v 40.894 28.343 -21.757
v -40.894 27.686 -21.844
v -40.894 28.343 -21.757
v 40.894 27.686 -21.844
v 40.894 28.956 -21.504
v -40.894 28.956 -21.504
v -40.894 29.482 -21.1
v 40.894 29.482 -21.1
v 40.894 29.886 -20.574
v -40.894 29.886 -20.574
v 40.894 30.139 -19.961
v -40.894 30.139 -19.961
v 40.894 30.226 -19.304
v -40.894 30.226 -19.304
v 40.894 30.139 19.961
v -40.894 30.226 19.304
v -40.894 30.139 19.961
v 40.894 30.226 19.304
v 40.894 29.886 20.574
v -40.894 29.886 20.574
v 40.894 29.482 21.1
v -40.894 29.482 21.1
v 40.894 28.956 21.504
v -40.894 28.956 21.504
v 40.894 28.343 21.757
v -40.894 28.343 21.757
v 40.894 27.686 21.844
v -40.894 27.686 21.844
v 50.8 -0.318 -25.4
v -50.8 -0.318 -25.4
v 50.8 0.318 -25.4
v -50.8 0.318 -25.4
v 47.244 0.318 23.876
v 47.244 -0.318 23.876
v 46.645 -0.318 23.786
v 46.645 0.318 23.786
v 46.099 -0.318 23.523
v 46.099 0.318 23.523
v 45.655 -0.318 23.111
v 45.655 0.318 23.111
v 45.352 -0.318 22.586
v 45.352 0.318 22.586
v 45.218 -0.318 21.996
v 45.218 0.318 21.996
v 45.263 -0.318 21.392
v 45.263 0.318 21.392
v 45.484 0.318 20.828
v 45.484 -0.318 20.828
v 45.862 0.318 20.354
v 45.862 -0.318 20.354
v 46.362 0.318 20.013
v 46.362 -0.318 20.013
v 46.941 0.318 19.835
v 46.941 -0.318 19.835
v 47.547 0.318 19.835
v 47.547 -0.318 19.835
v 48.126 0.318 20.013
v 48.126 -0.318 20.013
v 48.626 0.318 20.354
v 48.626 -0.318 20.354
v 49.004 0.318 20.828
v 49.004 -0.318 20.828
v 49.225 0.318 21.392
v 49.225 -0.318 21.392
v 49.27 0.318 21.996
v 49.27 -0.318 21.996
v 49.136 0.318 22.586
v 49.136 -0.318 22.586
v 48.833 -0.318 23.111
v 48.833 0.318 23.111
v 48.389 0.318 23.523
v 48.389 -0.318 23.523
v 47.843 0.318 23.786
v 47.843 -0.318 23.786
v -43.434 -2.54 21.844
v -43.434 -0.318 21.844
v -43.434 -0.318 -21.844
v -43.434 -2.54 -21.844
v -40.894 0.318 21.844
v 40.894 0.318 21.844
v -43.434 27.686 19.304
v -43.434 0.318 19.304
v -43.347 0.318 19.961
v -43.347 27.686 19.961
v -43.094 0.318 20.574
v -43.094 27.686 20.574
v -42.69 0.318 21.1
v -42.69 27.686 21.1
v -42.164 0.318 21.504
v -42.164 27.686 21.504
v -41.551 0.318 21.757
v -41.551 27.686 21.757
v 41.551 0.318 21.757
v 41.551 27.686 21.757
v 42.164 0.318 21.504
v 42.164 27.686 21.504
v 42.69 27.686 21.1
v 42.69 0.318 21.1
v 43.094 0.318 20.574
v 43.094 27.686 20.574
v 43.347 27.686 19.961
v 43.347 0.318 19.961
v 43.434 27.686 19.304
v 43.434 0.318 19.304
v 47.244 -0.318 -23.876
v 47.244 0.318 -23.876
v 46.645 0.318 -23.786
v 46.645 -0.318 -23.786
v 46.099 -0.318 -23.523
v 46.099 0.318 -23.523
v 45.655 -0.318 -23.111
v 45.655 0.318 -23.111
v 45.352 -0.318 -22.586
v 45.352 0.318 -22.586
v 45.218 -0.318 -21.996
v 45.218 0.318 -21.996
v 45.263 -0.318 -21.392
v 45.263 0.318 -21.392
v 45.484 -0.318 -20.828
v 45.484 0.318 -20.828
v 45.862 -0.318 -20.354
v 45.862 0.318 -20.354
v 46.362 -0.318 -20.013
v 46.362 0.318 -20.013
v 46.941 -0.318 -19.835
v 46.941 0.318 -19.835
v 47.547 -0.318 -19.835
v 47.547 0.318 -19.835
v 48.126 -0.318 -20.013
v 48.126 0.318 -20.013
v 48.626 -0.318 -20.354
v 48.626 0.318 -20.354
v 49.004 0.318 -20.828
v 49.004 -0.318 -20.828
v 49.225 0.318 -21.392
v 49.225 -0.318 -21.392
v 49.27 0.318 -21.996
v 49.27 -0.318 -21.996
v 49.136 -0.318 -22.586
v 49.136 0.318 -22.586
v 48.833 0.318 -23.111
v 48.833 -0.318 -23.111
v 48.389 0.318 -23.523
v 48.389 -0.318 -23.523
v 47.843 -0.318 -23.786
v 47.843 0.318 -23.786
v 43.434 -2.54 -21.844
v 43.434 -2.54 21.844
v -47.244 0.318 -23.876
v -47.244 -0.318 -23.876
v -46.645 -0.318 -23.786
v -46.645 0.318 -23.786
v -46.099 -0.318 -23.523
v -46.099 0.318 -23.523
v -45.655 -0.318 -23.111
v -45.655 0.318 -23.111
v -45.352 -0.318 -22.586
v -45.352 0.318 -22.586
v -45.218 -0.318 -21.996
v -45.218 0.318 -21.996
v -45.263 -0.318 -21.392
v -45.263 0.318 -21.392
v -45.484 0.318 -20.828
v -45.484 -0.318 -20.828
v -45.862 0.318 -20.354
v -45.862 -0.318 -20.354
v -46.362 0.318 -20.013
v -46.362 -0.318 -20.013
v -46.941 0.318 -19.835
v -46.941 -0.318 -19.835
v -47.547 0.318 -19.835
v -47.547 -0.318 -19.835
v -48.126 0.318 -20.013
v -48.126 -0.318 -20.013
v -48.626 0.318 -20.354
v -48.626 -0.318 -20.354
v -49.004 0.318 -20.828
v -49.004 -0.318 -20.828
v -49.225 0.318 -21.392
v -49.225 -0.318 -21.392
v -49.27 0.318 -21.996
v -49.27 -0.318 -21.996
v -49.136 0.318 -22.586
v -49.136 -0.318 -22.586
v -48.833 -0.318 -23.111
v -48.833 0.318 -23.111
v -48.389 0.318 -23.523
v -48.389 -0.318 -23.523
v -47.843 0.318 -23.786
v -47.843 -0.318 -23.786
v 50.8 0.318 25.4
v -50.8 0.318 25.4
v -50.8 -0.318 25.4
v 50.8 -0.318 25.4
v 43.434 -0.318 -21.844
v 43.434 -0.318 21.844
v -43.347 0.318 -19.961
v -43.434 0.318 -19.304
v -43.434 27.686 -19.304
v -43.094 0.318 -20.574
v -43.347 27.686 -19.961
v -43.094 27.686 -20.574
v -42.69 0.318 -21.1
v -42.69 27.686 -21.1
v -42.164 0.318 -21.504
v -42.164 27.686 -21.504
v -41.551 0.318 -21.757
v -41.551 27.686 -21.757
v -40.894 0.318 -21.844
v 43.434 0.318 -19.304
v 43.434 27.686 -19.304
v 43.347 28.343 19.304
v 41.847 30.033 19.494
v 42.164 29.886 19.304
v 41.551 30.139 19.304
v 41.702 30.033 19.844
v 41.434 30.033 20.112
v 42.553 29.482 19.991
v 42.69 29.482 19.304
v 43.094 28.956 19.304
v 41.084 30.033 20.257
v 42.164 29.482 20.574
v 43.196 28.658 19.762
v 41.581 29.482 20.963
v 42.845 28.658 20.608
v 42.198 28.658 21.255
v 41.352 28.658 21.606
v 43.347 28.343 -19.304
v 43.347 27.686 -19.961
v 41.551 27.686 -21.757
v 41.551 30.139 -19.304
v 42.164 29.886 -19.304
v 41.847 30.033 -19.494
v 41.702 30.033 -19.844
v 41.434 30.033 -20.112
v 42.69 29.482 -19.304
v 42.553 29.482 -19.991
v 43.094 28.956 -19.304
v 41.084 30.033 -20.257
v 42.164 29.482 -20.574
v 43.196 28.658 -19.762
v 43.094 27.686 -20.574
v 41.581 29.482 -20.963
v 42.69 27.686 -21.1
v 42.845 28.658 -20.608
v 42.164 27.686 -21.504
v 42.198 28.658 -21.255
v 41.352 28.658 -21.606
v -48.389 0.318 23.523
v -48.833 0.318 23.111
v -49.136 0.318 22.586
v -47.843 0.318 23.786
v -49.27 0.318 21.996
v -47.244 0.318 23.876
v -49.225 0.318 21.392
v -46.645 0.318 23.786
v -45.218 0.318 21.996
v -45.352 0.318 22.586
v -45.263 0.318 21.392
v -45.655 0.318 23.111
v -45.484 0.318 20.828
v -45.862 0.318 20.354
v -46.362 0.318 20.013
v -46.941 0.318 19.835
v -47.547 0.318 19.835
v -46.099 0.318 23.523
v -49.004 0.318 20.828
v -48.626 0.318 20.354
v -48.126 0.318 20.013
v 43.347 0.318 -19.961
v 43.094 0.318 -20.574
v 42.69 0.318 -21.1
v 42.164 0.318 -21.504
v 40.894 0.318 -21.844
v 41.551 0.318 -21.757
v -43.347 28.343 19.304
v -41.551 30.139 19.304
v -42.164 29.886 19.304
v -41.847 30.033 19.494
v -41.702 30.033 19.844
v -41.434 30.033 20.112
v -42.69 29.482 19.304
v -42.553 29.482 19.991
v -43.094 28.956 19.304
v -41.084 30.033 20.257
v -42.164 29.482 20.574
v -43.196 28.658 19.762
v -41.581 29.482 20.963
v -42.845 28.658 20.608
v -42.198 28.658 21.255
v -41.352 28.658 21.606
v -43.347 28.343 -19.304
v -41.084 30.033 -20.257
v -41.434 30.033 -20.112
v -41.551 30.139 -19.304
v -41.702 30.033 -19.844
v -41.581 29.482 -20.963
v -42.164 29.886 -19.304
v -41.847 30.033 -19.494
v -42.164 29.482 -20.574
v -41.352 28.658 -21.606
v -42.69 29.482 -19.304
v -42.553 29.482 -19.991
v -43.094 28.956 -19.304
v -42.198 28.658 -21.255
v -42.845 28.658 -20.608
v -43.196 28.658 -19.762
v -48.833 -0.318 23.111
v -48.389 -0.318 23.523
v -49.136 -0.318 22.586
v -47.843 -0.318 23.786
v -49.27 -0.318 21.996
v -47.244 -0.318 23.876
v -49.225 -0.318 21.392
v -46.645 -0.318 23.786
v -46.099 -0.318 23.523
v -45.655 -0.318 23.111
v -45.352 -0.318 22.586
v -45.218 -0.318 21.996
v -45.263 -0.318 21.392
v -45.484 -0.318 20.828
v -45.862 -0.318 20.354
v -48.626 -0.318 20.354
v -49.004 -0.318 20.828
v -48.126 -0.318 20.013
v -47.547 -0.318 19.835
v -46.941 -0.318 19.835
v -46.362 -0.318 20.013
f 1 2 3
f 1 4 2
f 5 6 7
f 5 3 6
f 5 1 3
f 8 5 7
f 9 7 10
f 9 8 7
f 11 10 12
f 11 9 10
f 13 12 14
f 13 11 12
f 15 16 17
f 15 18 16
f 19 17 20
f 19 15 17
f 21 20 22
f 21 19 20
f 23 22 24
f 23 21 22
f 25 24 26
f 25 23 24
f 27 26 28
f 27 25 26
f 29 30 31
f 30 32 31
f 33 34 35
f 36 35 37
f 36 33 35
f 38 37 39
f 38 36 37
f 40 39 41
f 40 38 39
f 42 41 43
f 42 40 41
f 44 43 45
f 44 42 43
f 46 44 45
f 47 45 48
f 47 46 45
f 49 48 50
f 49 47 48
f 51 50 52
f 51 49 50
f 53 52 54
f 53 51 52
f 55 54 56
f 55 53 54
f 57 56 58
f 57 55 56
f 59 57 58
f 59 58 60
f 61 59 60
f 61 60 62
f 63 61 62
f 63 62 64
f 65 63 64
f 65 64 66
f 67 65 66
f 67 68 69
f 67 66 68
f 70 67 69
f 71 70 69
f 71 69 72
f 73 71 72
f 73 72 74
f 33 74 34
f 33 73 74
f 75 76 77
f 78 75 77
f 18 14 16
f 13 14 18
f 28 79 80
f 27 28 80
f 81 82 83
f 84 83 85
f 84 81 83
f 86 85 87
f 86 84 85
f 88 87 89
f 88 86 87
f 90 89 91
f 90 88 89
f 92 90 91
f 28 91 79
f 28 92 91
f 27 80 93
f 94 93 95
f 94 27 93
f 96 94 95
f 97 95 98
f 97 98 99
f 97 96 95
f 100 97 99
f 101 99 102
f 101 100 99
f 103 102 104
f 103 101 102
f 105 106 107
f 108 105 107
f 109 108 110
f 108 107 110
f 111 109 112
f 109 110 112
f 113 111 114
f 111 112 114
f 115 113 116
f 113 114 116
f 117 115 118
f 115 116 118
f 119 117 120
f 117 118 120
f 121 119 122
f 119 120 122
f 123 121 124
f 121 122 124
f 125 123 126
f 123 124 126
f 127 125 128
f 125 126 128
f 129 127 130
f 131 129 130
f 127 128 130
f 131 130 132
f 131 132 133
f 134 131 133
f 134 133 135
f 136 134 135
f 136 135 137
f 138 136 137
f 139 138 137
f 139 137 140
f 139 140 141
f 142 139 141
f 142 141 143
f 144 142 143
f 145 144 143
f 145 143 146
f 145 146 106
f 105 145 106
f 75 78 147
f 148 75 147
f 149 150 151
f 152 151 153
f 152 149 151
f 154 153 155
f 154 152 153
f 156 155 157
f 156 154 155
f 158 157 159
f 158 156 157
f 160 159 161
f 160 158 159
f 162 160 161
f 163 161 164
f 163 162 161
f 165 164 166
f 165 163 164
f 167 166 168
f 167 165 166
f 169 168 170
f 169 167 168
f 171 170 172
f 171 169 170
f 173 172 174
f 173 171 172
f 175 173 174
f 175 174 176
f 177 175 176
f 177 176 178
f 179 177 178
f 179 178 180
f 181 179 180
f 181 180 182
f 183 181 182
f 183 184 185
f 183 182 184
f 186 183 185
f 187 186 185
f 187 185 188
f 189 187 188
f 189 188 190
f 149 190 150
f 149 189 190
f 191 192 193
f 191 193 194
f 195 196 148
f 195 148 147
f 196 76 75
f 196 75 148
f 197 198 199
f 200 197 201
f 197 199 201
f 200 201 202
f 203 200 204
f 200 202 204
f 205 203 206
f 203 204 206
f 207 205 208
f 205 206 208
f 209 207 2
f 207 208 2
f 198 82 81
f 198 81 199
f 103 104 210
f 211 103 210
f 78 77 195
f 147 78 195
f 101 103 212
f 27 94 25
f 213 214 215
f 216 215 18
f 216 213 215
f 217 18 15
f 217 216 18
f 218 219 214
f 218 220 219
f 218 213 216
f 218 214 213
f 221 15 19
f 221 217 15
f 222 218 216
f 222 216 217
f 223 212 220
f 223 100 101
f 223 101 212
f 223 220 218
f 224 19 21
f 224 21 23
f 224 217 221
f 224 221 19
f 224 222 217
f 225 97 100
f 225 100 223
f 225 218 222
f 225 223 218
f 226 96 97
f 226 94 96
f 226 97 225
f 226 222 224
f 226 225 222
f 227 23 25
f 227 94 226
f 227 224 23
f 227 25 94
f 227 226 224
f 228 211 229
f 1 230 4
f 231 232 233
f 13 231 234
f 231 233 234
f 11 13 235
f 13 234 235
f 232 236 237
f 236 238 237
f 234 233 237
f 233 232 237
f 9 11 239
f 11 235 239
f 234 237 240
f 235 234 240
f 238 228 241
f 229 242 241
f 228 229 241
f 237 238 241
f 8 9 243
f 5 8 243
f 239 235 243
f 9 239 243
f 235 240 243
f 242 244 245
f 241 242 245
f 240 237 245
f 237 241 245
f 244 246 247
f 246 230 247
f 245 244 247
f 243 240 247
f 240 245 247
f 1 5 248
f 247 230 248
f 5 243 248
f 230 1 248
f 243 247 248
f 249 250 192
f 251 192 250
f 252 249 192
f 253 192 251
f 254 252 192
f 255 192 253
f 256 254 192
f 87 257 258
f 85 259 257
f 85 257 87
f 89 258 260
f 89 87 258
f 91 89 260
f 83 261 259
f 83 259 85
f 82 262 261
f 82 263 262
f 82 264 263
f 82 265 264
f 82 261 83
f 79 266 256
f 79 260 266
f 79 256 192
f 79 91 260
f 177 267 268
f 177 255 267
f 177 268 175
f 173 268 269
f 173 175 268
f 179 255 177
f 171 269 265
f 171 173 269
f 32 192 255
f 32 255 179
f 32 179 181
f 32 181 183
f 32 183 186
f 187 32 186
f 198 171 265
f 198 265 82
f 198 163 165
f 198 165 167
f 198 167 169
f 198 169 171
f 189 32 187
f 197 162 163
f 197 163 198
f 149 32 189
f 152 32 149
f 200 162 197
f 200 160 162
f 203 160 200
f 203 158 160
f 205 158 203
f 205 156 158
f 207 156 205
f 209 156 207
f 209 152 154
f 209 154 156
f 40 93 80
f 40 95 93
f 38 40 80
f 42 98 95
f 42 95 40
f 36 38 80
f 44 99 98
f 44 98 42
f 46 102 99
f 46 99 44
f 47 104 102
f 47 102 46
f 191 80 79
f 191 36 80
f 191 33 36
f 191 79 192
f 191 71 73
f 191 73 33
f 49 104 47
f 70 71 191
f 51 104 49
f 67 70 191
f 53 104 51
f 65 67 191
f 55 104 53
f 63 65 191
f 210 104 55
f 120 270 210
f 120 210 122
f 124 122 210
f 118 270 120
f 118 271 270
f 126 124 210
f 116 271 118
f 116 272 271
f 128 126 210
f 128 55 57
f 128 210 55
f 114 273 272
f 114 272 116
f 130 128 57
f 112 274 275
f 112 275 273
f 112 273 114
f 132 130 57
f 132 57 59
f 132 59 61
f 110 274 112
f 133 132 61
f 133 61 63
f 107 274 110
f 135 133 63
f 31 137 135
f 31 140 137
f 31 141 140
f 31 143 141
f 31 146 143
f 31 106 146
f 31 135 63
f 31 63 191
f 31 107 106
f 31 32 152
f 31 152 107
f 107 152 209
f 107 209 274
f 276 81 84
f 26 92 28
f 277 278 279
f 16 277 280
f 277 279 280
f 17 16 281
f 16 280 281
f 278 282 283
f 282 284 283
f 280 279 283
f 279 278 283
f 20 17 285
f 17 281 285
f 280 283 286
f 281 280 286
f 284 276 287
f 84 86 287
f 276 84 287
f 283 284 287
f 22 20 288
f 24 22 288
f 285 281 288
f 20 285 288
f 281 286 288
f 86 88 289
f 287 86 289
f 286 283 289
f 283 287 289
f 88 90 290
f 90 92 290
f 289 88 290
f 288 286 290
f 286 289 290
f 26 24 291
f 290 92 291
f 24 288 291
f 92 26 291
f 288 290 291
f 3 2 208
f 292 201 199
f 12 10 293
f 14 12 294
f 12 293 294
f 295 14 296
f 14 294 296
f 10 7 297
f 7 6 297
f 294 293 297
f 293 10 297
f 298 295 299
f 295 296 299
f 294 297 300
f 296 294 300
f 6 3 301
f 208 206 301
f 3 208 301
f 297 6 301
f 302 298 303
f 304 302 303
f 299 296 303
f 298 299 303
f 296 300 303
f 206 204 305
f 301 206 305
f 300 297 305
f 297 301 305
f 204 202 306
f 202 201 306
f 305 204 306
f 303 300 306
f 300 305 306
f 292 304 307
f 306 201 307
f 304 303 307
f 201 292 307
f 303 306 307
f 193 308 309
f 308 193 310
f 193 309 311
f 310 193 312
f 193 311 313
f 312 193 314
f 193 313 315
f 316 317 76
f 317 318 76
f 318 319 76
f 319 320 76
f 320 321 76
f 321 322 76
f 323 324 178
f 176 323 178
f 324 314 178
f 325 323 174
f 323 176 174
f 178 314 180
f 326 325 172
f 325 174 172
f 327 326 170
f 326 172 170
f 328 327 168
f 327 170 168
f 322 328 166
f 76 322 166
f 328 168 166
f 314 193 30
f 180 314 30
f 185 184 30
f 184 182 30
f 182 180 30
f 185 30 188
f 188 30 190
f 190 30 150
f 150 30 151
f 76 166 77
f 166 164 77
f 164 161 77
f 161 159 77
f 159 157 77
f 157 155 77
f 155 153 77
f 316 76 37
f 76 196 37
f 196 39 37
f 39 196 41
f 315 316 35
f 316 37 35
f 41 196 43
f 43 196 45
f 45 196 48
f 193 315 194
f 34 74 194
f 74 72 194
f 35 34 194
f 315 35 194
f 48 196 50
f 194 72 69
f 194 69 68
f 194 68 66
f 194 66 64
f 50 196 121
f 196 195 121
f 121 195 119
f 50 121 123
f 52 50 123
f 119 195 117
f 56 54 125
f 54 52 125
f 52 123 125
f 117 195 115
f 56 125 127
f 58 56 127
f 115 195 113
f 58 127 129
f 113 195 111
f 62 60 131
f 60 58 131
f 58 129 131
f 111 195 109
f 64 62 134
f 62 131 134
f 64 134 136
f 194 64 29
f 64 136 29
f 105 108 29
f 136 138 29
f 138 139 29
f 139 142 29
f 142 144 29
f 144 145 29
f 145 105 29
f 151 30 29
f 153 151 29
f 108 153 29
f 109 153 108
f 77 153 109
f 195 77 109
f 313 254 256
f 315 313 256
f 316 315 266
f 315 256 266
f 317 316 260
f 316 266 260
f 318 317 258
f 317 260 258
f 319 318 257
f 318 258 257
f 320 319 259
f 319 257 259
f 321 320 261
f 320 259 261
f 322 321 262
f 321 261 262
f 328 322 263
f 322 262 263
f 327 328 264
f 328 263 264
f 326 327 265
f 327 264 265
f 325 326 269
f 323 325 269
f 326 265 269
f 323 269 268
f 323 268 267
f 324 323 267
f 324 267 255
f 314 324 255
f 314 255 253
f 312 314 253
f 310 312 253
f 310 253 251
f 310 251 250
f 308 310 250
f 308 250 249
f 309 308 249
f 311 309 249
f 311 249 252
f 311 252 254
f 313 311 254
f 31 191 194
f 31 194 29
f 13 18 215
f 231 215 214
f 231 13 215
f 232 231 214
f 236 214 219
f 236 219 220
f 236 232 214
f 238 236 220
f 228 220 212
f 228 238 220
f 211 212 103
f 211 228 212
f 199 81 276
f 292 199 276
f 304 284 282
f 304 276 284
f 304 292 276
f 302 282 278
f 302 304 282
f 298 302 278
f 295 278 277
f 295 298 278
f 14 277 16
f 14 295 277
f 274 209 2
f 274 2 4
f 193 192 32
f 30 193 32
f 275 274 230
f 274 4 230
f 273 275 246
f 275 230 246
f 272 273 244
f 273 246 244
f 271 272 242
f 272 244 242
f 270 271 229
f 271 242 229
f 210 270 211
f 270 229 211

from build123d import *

# Parameters (mm, degrees)
SKETCH1_W               = 101.6
SKETCH1_H               = 50.8
BOSS_EXTRUDE1_DEPTH     = 0.3175
SKETCH2_R               = 2.032
CUT_EXTRUDE1_DEPTH      = 57.799676275
MIRROR2_COPY_1_SKETCH_R = 2.032
MIRROR2_COPY_1_DEPTH    = 57.799676275
SKETCH3_W               = 86.868
SKETCH3_H               = 43.688
BOSS_EXTRUDE2_DEPTH     = 2.54
SKETCH3_2_W             = 86.868
SKETCH3_2_H             = 43.688
BOSS_EXTRUDE3_DEPTH     = 30.226
FILLET1_R               = 2.54


with BuildPart() as part:
    # Sketch1 → Boss-Extrude1 (new, symmetric)
    with BuildSketch(Plane(origin=(0, 0, 0), x_dir=(1, 0, 0), z_dir=(0, 1, 0))):
        Rectangle(SKETCH1_W, SKETCH1_H)
    extrude(amount=BOSS_EXTRUDE1_DEPTH, both=True)

    # Sketch2 → Cut-Extrude1 (cut, through all)
    with BuildSketch(Plane(origin=(0, 0.3175, 0), x_dir=(1, 0, 0), z_dir=(0, 1, 0))):
        with Locations(Location((-47.244, -21.844, 0), (0, 0, 270))):
            Circle(SKETCH2_R)
    cut_extrude1 = extrude(amount=-CUT_EXTRUDE1_DEPTH, mode=Mode.SUBTRACT)

    # Mirror1: Cut-Extrude1 across plane
    add(cut_extrude1.mirror(Plane.XY), mode=Mode.SUBTRACT)

    # Mirror2: Cut-Extrude1 across plane
    add(cut_extrude1.mirror(Plane(origin=(0, 0, 0), x_dir=(0, 0, 1), z_dir=(1, 0, 0))), mode=Mode.SUBTRACT)

    # Mirror2 copy 1 sketch → Mirror2 copy 1 (cut, through all)
    with BuildSketch(Plane(origin=(0, 0.3175, 0), x_dir=(-1, 0, 0), z_dir=(0, 1, 0))):
        with Locations(Location((-47.244, -21.844, 0), (0, 0, 270))):
            Circle(MIRROR2_COPY_1_SKETCH_R)
    extrude(amount=-MIRROR2_COPY_1_DEPTH, mode=Mode.SUBTRACT)

    # Sketch3 → Boss-Extrude2 (add)
    with BuildSketch(Plane(origin=(0, 0, 0), x_dir=(1, 0, 0), z_dir=(0, 1, 0))):
        Rectangle(SKETCH3_W, SKETCH3_H)
    extrude(amount=-BOSS_EXTRUDE2_DEPTH)

    # Sketch3<2> → Boss-Extrude3 (add)
    with BuildSketch(Plane(origin=(0, 0, 0), x_dir=(1, 0, 0), z_dir=(0, 1, 0))):
        Rectangle(SKETCH3_2_W, SKETCH3_2_H)
    extrude(amount=BOSS_EXTRUDE3_DEPTH)

    # Fillet1
    fillet1_edges = [part.edges().sort_by_distance(p)[0] for p in [
        (43.434, 15.27175, 21.844),
        (43.434, 15.27175, -21.844),
        (-43.434, 15.27175, -21.844),
        (-43.434, 15.27175, 21.844),
        (43.434, 30.226, 0),
        (0, 30.226, -21.844),
        (-43.434, 30.226, 0),
        (0, 30.226, 21.844),
    ]]
    fillet(fillet1_edges, radius=FILLET1_R)


solid = part.part
